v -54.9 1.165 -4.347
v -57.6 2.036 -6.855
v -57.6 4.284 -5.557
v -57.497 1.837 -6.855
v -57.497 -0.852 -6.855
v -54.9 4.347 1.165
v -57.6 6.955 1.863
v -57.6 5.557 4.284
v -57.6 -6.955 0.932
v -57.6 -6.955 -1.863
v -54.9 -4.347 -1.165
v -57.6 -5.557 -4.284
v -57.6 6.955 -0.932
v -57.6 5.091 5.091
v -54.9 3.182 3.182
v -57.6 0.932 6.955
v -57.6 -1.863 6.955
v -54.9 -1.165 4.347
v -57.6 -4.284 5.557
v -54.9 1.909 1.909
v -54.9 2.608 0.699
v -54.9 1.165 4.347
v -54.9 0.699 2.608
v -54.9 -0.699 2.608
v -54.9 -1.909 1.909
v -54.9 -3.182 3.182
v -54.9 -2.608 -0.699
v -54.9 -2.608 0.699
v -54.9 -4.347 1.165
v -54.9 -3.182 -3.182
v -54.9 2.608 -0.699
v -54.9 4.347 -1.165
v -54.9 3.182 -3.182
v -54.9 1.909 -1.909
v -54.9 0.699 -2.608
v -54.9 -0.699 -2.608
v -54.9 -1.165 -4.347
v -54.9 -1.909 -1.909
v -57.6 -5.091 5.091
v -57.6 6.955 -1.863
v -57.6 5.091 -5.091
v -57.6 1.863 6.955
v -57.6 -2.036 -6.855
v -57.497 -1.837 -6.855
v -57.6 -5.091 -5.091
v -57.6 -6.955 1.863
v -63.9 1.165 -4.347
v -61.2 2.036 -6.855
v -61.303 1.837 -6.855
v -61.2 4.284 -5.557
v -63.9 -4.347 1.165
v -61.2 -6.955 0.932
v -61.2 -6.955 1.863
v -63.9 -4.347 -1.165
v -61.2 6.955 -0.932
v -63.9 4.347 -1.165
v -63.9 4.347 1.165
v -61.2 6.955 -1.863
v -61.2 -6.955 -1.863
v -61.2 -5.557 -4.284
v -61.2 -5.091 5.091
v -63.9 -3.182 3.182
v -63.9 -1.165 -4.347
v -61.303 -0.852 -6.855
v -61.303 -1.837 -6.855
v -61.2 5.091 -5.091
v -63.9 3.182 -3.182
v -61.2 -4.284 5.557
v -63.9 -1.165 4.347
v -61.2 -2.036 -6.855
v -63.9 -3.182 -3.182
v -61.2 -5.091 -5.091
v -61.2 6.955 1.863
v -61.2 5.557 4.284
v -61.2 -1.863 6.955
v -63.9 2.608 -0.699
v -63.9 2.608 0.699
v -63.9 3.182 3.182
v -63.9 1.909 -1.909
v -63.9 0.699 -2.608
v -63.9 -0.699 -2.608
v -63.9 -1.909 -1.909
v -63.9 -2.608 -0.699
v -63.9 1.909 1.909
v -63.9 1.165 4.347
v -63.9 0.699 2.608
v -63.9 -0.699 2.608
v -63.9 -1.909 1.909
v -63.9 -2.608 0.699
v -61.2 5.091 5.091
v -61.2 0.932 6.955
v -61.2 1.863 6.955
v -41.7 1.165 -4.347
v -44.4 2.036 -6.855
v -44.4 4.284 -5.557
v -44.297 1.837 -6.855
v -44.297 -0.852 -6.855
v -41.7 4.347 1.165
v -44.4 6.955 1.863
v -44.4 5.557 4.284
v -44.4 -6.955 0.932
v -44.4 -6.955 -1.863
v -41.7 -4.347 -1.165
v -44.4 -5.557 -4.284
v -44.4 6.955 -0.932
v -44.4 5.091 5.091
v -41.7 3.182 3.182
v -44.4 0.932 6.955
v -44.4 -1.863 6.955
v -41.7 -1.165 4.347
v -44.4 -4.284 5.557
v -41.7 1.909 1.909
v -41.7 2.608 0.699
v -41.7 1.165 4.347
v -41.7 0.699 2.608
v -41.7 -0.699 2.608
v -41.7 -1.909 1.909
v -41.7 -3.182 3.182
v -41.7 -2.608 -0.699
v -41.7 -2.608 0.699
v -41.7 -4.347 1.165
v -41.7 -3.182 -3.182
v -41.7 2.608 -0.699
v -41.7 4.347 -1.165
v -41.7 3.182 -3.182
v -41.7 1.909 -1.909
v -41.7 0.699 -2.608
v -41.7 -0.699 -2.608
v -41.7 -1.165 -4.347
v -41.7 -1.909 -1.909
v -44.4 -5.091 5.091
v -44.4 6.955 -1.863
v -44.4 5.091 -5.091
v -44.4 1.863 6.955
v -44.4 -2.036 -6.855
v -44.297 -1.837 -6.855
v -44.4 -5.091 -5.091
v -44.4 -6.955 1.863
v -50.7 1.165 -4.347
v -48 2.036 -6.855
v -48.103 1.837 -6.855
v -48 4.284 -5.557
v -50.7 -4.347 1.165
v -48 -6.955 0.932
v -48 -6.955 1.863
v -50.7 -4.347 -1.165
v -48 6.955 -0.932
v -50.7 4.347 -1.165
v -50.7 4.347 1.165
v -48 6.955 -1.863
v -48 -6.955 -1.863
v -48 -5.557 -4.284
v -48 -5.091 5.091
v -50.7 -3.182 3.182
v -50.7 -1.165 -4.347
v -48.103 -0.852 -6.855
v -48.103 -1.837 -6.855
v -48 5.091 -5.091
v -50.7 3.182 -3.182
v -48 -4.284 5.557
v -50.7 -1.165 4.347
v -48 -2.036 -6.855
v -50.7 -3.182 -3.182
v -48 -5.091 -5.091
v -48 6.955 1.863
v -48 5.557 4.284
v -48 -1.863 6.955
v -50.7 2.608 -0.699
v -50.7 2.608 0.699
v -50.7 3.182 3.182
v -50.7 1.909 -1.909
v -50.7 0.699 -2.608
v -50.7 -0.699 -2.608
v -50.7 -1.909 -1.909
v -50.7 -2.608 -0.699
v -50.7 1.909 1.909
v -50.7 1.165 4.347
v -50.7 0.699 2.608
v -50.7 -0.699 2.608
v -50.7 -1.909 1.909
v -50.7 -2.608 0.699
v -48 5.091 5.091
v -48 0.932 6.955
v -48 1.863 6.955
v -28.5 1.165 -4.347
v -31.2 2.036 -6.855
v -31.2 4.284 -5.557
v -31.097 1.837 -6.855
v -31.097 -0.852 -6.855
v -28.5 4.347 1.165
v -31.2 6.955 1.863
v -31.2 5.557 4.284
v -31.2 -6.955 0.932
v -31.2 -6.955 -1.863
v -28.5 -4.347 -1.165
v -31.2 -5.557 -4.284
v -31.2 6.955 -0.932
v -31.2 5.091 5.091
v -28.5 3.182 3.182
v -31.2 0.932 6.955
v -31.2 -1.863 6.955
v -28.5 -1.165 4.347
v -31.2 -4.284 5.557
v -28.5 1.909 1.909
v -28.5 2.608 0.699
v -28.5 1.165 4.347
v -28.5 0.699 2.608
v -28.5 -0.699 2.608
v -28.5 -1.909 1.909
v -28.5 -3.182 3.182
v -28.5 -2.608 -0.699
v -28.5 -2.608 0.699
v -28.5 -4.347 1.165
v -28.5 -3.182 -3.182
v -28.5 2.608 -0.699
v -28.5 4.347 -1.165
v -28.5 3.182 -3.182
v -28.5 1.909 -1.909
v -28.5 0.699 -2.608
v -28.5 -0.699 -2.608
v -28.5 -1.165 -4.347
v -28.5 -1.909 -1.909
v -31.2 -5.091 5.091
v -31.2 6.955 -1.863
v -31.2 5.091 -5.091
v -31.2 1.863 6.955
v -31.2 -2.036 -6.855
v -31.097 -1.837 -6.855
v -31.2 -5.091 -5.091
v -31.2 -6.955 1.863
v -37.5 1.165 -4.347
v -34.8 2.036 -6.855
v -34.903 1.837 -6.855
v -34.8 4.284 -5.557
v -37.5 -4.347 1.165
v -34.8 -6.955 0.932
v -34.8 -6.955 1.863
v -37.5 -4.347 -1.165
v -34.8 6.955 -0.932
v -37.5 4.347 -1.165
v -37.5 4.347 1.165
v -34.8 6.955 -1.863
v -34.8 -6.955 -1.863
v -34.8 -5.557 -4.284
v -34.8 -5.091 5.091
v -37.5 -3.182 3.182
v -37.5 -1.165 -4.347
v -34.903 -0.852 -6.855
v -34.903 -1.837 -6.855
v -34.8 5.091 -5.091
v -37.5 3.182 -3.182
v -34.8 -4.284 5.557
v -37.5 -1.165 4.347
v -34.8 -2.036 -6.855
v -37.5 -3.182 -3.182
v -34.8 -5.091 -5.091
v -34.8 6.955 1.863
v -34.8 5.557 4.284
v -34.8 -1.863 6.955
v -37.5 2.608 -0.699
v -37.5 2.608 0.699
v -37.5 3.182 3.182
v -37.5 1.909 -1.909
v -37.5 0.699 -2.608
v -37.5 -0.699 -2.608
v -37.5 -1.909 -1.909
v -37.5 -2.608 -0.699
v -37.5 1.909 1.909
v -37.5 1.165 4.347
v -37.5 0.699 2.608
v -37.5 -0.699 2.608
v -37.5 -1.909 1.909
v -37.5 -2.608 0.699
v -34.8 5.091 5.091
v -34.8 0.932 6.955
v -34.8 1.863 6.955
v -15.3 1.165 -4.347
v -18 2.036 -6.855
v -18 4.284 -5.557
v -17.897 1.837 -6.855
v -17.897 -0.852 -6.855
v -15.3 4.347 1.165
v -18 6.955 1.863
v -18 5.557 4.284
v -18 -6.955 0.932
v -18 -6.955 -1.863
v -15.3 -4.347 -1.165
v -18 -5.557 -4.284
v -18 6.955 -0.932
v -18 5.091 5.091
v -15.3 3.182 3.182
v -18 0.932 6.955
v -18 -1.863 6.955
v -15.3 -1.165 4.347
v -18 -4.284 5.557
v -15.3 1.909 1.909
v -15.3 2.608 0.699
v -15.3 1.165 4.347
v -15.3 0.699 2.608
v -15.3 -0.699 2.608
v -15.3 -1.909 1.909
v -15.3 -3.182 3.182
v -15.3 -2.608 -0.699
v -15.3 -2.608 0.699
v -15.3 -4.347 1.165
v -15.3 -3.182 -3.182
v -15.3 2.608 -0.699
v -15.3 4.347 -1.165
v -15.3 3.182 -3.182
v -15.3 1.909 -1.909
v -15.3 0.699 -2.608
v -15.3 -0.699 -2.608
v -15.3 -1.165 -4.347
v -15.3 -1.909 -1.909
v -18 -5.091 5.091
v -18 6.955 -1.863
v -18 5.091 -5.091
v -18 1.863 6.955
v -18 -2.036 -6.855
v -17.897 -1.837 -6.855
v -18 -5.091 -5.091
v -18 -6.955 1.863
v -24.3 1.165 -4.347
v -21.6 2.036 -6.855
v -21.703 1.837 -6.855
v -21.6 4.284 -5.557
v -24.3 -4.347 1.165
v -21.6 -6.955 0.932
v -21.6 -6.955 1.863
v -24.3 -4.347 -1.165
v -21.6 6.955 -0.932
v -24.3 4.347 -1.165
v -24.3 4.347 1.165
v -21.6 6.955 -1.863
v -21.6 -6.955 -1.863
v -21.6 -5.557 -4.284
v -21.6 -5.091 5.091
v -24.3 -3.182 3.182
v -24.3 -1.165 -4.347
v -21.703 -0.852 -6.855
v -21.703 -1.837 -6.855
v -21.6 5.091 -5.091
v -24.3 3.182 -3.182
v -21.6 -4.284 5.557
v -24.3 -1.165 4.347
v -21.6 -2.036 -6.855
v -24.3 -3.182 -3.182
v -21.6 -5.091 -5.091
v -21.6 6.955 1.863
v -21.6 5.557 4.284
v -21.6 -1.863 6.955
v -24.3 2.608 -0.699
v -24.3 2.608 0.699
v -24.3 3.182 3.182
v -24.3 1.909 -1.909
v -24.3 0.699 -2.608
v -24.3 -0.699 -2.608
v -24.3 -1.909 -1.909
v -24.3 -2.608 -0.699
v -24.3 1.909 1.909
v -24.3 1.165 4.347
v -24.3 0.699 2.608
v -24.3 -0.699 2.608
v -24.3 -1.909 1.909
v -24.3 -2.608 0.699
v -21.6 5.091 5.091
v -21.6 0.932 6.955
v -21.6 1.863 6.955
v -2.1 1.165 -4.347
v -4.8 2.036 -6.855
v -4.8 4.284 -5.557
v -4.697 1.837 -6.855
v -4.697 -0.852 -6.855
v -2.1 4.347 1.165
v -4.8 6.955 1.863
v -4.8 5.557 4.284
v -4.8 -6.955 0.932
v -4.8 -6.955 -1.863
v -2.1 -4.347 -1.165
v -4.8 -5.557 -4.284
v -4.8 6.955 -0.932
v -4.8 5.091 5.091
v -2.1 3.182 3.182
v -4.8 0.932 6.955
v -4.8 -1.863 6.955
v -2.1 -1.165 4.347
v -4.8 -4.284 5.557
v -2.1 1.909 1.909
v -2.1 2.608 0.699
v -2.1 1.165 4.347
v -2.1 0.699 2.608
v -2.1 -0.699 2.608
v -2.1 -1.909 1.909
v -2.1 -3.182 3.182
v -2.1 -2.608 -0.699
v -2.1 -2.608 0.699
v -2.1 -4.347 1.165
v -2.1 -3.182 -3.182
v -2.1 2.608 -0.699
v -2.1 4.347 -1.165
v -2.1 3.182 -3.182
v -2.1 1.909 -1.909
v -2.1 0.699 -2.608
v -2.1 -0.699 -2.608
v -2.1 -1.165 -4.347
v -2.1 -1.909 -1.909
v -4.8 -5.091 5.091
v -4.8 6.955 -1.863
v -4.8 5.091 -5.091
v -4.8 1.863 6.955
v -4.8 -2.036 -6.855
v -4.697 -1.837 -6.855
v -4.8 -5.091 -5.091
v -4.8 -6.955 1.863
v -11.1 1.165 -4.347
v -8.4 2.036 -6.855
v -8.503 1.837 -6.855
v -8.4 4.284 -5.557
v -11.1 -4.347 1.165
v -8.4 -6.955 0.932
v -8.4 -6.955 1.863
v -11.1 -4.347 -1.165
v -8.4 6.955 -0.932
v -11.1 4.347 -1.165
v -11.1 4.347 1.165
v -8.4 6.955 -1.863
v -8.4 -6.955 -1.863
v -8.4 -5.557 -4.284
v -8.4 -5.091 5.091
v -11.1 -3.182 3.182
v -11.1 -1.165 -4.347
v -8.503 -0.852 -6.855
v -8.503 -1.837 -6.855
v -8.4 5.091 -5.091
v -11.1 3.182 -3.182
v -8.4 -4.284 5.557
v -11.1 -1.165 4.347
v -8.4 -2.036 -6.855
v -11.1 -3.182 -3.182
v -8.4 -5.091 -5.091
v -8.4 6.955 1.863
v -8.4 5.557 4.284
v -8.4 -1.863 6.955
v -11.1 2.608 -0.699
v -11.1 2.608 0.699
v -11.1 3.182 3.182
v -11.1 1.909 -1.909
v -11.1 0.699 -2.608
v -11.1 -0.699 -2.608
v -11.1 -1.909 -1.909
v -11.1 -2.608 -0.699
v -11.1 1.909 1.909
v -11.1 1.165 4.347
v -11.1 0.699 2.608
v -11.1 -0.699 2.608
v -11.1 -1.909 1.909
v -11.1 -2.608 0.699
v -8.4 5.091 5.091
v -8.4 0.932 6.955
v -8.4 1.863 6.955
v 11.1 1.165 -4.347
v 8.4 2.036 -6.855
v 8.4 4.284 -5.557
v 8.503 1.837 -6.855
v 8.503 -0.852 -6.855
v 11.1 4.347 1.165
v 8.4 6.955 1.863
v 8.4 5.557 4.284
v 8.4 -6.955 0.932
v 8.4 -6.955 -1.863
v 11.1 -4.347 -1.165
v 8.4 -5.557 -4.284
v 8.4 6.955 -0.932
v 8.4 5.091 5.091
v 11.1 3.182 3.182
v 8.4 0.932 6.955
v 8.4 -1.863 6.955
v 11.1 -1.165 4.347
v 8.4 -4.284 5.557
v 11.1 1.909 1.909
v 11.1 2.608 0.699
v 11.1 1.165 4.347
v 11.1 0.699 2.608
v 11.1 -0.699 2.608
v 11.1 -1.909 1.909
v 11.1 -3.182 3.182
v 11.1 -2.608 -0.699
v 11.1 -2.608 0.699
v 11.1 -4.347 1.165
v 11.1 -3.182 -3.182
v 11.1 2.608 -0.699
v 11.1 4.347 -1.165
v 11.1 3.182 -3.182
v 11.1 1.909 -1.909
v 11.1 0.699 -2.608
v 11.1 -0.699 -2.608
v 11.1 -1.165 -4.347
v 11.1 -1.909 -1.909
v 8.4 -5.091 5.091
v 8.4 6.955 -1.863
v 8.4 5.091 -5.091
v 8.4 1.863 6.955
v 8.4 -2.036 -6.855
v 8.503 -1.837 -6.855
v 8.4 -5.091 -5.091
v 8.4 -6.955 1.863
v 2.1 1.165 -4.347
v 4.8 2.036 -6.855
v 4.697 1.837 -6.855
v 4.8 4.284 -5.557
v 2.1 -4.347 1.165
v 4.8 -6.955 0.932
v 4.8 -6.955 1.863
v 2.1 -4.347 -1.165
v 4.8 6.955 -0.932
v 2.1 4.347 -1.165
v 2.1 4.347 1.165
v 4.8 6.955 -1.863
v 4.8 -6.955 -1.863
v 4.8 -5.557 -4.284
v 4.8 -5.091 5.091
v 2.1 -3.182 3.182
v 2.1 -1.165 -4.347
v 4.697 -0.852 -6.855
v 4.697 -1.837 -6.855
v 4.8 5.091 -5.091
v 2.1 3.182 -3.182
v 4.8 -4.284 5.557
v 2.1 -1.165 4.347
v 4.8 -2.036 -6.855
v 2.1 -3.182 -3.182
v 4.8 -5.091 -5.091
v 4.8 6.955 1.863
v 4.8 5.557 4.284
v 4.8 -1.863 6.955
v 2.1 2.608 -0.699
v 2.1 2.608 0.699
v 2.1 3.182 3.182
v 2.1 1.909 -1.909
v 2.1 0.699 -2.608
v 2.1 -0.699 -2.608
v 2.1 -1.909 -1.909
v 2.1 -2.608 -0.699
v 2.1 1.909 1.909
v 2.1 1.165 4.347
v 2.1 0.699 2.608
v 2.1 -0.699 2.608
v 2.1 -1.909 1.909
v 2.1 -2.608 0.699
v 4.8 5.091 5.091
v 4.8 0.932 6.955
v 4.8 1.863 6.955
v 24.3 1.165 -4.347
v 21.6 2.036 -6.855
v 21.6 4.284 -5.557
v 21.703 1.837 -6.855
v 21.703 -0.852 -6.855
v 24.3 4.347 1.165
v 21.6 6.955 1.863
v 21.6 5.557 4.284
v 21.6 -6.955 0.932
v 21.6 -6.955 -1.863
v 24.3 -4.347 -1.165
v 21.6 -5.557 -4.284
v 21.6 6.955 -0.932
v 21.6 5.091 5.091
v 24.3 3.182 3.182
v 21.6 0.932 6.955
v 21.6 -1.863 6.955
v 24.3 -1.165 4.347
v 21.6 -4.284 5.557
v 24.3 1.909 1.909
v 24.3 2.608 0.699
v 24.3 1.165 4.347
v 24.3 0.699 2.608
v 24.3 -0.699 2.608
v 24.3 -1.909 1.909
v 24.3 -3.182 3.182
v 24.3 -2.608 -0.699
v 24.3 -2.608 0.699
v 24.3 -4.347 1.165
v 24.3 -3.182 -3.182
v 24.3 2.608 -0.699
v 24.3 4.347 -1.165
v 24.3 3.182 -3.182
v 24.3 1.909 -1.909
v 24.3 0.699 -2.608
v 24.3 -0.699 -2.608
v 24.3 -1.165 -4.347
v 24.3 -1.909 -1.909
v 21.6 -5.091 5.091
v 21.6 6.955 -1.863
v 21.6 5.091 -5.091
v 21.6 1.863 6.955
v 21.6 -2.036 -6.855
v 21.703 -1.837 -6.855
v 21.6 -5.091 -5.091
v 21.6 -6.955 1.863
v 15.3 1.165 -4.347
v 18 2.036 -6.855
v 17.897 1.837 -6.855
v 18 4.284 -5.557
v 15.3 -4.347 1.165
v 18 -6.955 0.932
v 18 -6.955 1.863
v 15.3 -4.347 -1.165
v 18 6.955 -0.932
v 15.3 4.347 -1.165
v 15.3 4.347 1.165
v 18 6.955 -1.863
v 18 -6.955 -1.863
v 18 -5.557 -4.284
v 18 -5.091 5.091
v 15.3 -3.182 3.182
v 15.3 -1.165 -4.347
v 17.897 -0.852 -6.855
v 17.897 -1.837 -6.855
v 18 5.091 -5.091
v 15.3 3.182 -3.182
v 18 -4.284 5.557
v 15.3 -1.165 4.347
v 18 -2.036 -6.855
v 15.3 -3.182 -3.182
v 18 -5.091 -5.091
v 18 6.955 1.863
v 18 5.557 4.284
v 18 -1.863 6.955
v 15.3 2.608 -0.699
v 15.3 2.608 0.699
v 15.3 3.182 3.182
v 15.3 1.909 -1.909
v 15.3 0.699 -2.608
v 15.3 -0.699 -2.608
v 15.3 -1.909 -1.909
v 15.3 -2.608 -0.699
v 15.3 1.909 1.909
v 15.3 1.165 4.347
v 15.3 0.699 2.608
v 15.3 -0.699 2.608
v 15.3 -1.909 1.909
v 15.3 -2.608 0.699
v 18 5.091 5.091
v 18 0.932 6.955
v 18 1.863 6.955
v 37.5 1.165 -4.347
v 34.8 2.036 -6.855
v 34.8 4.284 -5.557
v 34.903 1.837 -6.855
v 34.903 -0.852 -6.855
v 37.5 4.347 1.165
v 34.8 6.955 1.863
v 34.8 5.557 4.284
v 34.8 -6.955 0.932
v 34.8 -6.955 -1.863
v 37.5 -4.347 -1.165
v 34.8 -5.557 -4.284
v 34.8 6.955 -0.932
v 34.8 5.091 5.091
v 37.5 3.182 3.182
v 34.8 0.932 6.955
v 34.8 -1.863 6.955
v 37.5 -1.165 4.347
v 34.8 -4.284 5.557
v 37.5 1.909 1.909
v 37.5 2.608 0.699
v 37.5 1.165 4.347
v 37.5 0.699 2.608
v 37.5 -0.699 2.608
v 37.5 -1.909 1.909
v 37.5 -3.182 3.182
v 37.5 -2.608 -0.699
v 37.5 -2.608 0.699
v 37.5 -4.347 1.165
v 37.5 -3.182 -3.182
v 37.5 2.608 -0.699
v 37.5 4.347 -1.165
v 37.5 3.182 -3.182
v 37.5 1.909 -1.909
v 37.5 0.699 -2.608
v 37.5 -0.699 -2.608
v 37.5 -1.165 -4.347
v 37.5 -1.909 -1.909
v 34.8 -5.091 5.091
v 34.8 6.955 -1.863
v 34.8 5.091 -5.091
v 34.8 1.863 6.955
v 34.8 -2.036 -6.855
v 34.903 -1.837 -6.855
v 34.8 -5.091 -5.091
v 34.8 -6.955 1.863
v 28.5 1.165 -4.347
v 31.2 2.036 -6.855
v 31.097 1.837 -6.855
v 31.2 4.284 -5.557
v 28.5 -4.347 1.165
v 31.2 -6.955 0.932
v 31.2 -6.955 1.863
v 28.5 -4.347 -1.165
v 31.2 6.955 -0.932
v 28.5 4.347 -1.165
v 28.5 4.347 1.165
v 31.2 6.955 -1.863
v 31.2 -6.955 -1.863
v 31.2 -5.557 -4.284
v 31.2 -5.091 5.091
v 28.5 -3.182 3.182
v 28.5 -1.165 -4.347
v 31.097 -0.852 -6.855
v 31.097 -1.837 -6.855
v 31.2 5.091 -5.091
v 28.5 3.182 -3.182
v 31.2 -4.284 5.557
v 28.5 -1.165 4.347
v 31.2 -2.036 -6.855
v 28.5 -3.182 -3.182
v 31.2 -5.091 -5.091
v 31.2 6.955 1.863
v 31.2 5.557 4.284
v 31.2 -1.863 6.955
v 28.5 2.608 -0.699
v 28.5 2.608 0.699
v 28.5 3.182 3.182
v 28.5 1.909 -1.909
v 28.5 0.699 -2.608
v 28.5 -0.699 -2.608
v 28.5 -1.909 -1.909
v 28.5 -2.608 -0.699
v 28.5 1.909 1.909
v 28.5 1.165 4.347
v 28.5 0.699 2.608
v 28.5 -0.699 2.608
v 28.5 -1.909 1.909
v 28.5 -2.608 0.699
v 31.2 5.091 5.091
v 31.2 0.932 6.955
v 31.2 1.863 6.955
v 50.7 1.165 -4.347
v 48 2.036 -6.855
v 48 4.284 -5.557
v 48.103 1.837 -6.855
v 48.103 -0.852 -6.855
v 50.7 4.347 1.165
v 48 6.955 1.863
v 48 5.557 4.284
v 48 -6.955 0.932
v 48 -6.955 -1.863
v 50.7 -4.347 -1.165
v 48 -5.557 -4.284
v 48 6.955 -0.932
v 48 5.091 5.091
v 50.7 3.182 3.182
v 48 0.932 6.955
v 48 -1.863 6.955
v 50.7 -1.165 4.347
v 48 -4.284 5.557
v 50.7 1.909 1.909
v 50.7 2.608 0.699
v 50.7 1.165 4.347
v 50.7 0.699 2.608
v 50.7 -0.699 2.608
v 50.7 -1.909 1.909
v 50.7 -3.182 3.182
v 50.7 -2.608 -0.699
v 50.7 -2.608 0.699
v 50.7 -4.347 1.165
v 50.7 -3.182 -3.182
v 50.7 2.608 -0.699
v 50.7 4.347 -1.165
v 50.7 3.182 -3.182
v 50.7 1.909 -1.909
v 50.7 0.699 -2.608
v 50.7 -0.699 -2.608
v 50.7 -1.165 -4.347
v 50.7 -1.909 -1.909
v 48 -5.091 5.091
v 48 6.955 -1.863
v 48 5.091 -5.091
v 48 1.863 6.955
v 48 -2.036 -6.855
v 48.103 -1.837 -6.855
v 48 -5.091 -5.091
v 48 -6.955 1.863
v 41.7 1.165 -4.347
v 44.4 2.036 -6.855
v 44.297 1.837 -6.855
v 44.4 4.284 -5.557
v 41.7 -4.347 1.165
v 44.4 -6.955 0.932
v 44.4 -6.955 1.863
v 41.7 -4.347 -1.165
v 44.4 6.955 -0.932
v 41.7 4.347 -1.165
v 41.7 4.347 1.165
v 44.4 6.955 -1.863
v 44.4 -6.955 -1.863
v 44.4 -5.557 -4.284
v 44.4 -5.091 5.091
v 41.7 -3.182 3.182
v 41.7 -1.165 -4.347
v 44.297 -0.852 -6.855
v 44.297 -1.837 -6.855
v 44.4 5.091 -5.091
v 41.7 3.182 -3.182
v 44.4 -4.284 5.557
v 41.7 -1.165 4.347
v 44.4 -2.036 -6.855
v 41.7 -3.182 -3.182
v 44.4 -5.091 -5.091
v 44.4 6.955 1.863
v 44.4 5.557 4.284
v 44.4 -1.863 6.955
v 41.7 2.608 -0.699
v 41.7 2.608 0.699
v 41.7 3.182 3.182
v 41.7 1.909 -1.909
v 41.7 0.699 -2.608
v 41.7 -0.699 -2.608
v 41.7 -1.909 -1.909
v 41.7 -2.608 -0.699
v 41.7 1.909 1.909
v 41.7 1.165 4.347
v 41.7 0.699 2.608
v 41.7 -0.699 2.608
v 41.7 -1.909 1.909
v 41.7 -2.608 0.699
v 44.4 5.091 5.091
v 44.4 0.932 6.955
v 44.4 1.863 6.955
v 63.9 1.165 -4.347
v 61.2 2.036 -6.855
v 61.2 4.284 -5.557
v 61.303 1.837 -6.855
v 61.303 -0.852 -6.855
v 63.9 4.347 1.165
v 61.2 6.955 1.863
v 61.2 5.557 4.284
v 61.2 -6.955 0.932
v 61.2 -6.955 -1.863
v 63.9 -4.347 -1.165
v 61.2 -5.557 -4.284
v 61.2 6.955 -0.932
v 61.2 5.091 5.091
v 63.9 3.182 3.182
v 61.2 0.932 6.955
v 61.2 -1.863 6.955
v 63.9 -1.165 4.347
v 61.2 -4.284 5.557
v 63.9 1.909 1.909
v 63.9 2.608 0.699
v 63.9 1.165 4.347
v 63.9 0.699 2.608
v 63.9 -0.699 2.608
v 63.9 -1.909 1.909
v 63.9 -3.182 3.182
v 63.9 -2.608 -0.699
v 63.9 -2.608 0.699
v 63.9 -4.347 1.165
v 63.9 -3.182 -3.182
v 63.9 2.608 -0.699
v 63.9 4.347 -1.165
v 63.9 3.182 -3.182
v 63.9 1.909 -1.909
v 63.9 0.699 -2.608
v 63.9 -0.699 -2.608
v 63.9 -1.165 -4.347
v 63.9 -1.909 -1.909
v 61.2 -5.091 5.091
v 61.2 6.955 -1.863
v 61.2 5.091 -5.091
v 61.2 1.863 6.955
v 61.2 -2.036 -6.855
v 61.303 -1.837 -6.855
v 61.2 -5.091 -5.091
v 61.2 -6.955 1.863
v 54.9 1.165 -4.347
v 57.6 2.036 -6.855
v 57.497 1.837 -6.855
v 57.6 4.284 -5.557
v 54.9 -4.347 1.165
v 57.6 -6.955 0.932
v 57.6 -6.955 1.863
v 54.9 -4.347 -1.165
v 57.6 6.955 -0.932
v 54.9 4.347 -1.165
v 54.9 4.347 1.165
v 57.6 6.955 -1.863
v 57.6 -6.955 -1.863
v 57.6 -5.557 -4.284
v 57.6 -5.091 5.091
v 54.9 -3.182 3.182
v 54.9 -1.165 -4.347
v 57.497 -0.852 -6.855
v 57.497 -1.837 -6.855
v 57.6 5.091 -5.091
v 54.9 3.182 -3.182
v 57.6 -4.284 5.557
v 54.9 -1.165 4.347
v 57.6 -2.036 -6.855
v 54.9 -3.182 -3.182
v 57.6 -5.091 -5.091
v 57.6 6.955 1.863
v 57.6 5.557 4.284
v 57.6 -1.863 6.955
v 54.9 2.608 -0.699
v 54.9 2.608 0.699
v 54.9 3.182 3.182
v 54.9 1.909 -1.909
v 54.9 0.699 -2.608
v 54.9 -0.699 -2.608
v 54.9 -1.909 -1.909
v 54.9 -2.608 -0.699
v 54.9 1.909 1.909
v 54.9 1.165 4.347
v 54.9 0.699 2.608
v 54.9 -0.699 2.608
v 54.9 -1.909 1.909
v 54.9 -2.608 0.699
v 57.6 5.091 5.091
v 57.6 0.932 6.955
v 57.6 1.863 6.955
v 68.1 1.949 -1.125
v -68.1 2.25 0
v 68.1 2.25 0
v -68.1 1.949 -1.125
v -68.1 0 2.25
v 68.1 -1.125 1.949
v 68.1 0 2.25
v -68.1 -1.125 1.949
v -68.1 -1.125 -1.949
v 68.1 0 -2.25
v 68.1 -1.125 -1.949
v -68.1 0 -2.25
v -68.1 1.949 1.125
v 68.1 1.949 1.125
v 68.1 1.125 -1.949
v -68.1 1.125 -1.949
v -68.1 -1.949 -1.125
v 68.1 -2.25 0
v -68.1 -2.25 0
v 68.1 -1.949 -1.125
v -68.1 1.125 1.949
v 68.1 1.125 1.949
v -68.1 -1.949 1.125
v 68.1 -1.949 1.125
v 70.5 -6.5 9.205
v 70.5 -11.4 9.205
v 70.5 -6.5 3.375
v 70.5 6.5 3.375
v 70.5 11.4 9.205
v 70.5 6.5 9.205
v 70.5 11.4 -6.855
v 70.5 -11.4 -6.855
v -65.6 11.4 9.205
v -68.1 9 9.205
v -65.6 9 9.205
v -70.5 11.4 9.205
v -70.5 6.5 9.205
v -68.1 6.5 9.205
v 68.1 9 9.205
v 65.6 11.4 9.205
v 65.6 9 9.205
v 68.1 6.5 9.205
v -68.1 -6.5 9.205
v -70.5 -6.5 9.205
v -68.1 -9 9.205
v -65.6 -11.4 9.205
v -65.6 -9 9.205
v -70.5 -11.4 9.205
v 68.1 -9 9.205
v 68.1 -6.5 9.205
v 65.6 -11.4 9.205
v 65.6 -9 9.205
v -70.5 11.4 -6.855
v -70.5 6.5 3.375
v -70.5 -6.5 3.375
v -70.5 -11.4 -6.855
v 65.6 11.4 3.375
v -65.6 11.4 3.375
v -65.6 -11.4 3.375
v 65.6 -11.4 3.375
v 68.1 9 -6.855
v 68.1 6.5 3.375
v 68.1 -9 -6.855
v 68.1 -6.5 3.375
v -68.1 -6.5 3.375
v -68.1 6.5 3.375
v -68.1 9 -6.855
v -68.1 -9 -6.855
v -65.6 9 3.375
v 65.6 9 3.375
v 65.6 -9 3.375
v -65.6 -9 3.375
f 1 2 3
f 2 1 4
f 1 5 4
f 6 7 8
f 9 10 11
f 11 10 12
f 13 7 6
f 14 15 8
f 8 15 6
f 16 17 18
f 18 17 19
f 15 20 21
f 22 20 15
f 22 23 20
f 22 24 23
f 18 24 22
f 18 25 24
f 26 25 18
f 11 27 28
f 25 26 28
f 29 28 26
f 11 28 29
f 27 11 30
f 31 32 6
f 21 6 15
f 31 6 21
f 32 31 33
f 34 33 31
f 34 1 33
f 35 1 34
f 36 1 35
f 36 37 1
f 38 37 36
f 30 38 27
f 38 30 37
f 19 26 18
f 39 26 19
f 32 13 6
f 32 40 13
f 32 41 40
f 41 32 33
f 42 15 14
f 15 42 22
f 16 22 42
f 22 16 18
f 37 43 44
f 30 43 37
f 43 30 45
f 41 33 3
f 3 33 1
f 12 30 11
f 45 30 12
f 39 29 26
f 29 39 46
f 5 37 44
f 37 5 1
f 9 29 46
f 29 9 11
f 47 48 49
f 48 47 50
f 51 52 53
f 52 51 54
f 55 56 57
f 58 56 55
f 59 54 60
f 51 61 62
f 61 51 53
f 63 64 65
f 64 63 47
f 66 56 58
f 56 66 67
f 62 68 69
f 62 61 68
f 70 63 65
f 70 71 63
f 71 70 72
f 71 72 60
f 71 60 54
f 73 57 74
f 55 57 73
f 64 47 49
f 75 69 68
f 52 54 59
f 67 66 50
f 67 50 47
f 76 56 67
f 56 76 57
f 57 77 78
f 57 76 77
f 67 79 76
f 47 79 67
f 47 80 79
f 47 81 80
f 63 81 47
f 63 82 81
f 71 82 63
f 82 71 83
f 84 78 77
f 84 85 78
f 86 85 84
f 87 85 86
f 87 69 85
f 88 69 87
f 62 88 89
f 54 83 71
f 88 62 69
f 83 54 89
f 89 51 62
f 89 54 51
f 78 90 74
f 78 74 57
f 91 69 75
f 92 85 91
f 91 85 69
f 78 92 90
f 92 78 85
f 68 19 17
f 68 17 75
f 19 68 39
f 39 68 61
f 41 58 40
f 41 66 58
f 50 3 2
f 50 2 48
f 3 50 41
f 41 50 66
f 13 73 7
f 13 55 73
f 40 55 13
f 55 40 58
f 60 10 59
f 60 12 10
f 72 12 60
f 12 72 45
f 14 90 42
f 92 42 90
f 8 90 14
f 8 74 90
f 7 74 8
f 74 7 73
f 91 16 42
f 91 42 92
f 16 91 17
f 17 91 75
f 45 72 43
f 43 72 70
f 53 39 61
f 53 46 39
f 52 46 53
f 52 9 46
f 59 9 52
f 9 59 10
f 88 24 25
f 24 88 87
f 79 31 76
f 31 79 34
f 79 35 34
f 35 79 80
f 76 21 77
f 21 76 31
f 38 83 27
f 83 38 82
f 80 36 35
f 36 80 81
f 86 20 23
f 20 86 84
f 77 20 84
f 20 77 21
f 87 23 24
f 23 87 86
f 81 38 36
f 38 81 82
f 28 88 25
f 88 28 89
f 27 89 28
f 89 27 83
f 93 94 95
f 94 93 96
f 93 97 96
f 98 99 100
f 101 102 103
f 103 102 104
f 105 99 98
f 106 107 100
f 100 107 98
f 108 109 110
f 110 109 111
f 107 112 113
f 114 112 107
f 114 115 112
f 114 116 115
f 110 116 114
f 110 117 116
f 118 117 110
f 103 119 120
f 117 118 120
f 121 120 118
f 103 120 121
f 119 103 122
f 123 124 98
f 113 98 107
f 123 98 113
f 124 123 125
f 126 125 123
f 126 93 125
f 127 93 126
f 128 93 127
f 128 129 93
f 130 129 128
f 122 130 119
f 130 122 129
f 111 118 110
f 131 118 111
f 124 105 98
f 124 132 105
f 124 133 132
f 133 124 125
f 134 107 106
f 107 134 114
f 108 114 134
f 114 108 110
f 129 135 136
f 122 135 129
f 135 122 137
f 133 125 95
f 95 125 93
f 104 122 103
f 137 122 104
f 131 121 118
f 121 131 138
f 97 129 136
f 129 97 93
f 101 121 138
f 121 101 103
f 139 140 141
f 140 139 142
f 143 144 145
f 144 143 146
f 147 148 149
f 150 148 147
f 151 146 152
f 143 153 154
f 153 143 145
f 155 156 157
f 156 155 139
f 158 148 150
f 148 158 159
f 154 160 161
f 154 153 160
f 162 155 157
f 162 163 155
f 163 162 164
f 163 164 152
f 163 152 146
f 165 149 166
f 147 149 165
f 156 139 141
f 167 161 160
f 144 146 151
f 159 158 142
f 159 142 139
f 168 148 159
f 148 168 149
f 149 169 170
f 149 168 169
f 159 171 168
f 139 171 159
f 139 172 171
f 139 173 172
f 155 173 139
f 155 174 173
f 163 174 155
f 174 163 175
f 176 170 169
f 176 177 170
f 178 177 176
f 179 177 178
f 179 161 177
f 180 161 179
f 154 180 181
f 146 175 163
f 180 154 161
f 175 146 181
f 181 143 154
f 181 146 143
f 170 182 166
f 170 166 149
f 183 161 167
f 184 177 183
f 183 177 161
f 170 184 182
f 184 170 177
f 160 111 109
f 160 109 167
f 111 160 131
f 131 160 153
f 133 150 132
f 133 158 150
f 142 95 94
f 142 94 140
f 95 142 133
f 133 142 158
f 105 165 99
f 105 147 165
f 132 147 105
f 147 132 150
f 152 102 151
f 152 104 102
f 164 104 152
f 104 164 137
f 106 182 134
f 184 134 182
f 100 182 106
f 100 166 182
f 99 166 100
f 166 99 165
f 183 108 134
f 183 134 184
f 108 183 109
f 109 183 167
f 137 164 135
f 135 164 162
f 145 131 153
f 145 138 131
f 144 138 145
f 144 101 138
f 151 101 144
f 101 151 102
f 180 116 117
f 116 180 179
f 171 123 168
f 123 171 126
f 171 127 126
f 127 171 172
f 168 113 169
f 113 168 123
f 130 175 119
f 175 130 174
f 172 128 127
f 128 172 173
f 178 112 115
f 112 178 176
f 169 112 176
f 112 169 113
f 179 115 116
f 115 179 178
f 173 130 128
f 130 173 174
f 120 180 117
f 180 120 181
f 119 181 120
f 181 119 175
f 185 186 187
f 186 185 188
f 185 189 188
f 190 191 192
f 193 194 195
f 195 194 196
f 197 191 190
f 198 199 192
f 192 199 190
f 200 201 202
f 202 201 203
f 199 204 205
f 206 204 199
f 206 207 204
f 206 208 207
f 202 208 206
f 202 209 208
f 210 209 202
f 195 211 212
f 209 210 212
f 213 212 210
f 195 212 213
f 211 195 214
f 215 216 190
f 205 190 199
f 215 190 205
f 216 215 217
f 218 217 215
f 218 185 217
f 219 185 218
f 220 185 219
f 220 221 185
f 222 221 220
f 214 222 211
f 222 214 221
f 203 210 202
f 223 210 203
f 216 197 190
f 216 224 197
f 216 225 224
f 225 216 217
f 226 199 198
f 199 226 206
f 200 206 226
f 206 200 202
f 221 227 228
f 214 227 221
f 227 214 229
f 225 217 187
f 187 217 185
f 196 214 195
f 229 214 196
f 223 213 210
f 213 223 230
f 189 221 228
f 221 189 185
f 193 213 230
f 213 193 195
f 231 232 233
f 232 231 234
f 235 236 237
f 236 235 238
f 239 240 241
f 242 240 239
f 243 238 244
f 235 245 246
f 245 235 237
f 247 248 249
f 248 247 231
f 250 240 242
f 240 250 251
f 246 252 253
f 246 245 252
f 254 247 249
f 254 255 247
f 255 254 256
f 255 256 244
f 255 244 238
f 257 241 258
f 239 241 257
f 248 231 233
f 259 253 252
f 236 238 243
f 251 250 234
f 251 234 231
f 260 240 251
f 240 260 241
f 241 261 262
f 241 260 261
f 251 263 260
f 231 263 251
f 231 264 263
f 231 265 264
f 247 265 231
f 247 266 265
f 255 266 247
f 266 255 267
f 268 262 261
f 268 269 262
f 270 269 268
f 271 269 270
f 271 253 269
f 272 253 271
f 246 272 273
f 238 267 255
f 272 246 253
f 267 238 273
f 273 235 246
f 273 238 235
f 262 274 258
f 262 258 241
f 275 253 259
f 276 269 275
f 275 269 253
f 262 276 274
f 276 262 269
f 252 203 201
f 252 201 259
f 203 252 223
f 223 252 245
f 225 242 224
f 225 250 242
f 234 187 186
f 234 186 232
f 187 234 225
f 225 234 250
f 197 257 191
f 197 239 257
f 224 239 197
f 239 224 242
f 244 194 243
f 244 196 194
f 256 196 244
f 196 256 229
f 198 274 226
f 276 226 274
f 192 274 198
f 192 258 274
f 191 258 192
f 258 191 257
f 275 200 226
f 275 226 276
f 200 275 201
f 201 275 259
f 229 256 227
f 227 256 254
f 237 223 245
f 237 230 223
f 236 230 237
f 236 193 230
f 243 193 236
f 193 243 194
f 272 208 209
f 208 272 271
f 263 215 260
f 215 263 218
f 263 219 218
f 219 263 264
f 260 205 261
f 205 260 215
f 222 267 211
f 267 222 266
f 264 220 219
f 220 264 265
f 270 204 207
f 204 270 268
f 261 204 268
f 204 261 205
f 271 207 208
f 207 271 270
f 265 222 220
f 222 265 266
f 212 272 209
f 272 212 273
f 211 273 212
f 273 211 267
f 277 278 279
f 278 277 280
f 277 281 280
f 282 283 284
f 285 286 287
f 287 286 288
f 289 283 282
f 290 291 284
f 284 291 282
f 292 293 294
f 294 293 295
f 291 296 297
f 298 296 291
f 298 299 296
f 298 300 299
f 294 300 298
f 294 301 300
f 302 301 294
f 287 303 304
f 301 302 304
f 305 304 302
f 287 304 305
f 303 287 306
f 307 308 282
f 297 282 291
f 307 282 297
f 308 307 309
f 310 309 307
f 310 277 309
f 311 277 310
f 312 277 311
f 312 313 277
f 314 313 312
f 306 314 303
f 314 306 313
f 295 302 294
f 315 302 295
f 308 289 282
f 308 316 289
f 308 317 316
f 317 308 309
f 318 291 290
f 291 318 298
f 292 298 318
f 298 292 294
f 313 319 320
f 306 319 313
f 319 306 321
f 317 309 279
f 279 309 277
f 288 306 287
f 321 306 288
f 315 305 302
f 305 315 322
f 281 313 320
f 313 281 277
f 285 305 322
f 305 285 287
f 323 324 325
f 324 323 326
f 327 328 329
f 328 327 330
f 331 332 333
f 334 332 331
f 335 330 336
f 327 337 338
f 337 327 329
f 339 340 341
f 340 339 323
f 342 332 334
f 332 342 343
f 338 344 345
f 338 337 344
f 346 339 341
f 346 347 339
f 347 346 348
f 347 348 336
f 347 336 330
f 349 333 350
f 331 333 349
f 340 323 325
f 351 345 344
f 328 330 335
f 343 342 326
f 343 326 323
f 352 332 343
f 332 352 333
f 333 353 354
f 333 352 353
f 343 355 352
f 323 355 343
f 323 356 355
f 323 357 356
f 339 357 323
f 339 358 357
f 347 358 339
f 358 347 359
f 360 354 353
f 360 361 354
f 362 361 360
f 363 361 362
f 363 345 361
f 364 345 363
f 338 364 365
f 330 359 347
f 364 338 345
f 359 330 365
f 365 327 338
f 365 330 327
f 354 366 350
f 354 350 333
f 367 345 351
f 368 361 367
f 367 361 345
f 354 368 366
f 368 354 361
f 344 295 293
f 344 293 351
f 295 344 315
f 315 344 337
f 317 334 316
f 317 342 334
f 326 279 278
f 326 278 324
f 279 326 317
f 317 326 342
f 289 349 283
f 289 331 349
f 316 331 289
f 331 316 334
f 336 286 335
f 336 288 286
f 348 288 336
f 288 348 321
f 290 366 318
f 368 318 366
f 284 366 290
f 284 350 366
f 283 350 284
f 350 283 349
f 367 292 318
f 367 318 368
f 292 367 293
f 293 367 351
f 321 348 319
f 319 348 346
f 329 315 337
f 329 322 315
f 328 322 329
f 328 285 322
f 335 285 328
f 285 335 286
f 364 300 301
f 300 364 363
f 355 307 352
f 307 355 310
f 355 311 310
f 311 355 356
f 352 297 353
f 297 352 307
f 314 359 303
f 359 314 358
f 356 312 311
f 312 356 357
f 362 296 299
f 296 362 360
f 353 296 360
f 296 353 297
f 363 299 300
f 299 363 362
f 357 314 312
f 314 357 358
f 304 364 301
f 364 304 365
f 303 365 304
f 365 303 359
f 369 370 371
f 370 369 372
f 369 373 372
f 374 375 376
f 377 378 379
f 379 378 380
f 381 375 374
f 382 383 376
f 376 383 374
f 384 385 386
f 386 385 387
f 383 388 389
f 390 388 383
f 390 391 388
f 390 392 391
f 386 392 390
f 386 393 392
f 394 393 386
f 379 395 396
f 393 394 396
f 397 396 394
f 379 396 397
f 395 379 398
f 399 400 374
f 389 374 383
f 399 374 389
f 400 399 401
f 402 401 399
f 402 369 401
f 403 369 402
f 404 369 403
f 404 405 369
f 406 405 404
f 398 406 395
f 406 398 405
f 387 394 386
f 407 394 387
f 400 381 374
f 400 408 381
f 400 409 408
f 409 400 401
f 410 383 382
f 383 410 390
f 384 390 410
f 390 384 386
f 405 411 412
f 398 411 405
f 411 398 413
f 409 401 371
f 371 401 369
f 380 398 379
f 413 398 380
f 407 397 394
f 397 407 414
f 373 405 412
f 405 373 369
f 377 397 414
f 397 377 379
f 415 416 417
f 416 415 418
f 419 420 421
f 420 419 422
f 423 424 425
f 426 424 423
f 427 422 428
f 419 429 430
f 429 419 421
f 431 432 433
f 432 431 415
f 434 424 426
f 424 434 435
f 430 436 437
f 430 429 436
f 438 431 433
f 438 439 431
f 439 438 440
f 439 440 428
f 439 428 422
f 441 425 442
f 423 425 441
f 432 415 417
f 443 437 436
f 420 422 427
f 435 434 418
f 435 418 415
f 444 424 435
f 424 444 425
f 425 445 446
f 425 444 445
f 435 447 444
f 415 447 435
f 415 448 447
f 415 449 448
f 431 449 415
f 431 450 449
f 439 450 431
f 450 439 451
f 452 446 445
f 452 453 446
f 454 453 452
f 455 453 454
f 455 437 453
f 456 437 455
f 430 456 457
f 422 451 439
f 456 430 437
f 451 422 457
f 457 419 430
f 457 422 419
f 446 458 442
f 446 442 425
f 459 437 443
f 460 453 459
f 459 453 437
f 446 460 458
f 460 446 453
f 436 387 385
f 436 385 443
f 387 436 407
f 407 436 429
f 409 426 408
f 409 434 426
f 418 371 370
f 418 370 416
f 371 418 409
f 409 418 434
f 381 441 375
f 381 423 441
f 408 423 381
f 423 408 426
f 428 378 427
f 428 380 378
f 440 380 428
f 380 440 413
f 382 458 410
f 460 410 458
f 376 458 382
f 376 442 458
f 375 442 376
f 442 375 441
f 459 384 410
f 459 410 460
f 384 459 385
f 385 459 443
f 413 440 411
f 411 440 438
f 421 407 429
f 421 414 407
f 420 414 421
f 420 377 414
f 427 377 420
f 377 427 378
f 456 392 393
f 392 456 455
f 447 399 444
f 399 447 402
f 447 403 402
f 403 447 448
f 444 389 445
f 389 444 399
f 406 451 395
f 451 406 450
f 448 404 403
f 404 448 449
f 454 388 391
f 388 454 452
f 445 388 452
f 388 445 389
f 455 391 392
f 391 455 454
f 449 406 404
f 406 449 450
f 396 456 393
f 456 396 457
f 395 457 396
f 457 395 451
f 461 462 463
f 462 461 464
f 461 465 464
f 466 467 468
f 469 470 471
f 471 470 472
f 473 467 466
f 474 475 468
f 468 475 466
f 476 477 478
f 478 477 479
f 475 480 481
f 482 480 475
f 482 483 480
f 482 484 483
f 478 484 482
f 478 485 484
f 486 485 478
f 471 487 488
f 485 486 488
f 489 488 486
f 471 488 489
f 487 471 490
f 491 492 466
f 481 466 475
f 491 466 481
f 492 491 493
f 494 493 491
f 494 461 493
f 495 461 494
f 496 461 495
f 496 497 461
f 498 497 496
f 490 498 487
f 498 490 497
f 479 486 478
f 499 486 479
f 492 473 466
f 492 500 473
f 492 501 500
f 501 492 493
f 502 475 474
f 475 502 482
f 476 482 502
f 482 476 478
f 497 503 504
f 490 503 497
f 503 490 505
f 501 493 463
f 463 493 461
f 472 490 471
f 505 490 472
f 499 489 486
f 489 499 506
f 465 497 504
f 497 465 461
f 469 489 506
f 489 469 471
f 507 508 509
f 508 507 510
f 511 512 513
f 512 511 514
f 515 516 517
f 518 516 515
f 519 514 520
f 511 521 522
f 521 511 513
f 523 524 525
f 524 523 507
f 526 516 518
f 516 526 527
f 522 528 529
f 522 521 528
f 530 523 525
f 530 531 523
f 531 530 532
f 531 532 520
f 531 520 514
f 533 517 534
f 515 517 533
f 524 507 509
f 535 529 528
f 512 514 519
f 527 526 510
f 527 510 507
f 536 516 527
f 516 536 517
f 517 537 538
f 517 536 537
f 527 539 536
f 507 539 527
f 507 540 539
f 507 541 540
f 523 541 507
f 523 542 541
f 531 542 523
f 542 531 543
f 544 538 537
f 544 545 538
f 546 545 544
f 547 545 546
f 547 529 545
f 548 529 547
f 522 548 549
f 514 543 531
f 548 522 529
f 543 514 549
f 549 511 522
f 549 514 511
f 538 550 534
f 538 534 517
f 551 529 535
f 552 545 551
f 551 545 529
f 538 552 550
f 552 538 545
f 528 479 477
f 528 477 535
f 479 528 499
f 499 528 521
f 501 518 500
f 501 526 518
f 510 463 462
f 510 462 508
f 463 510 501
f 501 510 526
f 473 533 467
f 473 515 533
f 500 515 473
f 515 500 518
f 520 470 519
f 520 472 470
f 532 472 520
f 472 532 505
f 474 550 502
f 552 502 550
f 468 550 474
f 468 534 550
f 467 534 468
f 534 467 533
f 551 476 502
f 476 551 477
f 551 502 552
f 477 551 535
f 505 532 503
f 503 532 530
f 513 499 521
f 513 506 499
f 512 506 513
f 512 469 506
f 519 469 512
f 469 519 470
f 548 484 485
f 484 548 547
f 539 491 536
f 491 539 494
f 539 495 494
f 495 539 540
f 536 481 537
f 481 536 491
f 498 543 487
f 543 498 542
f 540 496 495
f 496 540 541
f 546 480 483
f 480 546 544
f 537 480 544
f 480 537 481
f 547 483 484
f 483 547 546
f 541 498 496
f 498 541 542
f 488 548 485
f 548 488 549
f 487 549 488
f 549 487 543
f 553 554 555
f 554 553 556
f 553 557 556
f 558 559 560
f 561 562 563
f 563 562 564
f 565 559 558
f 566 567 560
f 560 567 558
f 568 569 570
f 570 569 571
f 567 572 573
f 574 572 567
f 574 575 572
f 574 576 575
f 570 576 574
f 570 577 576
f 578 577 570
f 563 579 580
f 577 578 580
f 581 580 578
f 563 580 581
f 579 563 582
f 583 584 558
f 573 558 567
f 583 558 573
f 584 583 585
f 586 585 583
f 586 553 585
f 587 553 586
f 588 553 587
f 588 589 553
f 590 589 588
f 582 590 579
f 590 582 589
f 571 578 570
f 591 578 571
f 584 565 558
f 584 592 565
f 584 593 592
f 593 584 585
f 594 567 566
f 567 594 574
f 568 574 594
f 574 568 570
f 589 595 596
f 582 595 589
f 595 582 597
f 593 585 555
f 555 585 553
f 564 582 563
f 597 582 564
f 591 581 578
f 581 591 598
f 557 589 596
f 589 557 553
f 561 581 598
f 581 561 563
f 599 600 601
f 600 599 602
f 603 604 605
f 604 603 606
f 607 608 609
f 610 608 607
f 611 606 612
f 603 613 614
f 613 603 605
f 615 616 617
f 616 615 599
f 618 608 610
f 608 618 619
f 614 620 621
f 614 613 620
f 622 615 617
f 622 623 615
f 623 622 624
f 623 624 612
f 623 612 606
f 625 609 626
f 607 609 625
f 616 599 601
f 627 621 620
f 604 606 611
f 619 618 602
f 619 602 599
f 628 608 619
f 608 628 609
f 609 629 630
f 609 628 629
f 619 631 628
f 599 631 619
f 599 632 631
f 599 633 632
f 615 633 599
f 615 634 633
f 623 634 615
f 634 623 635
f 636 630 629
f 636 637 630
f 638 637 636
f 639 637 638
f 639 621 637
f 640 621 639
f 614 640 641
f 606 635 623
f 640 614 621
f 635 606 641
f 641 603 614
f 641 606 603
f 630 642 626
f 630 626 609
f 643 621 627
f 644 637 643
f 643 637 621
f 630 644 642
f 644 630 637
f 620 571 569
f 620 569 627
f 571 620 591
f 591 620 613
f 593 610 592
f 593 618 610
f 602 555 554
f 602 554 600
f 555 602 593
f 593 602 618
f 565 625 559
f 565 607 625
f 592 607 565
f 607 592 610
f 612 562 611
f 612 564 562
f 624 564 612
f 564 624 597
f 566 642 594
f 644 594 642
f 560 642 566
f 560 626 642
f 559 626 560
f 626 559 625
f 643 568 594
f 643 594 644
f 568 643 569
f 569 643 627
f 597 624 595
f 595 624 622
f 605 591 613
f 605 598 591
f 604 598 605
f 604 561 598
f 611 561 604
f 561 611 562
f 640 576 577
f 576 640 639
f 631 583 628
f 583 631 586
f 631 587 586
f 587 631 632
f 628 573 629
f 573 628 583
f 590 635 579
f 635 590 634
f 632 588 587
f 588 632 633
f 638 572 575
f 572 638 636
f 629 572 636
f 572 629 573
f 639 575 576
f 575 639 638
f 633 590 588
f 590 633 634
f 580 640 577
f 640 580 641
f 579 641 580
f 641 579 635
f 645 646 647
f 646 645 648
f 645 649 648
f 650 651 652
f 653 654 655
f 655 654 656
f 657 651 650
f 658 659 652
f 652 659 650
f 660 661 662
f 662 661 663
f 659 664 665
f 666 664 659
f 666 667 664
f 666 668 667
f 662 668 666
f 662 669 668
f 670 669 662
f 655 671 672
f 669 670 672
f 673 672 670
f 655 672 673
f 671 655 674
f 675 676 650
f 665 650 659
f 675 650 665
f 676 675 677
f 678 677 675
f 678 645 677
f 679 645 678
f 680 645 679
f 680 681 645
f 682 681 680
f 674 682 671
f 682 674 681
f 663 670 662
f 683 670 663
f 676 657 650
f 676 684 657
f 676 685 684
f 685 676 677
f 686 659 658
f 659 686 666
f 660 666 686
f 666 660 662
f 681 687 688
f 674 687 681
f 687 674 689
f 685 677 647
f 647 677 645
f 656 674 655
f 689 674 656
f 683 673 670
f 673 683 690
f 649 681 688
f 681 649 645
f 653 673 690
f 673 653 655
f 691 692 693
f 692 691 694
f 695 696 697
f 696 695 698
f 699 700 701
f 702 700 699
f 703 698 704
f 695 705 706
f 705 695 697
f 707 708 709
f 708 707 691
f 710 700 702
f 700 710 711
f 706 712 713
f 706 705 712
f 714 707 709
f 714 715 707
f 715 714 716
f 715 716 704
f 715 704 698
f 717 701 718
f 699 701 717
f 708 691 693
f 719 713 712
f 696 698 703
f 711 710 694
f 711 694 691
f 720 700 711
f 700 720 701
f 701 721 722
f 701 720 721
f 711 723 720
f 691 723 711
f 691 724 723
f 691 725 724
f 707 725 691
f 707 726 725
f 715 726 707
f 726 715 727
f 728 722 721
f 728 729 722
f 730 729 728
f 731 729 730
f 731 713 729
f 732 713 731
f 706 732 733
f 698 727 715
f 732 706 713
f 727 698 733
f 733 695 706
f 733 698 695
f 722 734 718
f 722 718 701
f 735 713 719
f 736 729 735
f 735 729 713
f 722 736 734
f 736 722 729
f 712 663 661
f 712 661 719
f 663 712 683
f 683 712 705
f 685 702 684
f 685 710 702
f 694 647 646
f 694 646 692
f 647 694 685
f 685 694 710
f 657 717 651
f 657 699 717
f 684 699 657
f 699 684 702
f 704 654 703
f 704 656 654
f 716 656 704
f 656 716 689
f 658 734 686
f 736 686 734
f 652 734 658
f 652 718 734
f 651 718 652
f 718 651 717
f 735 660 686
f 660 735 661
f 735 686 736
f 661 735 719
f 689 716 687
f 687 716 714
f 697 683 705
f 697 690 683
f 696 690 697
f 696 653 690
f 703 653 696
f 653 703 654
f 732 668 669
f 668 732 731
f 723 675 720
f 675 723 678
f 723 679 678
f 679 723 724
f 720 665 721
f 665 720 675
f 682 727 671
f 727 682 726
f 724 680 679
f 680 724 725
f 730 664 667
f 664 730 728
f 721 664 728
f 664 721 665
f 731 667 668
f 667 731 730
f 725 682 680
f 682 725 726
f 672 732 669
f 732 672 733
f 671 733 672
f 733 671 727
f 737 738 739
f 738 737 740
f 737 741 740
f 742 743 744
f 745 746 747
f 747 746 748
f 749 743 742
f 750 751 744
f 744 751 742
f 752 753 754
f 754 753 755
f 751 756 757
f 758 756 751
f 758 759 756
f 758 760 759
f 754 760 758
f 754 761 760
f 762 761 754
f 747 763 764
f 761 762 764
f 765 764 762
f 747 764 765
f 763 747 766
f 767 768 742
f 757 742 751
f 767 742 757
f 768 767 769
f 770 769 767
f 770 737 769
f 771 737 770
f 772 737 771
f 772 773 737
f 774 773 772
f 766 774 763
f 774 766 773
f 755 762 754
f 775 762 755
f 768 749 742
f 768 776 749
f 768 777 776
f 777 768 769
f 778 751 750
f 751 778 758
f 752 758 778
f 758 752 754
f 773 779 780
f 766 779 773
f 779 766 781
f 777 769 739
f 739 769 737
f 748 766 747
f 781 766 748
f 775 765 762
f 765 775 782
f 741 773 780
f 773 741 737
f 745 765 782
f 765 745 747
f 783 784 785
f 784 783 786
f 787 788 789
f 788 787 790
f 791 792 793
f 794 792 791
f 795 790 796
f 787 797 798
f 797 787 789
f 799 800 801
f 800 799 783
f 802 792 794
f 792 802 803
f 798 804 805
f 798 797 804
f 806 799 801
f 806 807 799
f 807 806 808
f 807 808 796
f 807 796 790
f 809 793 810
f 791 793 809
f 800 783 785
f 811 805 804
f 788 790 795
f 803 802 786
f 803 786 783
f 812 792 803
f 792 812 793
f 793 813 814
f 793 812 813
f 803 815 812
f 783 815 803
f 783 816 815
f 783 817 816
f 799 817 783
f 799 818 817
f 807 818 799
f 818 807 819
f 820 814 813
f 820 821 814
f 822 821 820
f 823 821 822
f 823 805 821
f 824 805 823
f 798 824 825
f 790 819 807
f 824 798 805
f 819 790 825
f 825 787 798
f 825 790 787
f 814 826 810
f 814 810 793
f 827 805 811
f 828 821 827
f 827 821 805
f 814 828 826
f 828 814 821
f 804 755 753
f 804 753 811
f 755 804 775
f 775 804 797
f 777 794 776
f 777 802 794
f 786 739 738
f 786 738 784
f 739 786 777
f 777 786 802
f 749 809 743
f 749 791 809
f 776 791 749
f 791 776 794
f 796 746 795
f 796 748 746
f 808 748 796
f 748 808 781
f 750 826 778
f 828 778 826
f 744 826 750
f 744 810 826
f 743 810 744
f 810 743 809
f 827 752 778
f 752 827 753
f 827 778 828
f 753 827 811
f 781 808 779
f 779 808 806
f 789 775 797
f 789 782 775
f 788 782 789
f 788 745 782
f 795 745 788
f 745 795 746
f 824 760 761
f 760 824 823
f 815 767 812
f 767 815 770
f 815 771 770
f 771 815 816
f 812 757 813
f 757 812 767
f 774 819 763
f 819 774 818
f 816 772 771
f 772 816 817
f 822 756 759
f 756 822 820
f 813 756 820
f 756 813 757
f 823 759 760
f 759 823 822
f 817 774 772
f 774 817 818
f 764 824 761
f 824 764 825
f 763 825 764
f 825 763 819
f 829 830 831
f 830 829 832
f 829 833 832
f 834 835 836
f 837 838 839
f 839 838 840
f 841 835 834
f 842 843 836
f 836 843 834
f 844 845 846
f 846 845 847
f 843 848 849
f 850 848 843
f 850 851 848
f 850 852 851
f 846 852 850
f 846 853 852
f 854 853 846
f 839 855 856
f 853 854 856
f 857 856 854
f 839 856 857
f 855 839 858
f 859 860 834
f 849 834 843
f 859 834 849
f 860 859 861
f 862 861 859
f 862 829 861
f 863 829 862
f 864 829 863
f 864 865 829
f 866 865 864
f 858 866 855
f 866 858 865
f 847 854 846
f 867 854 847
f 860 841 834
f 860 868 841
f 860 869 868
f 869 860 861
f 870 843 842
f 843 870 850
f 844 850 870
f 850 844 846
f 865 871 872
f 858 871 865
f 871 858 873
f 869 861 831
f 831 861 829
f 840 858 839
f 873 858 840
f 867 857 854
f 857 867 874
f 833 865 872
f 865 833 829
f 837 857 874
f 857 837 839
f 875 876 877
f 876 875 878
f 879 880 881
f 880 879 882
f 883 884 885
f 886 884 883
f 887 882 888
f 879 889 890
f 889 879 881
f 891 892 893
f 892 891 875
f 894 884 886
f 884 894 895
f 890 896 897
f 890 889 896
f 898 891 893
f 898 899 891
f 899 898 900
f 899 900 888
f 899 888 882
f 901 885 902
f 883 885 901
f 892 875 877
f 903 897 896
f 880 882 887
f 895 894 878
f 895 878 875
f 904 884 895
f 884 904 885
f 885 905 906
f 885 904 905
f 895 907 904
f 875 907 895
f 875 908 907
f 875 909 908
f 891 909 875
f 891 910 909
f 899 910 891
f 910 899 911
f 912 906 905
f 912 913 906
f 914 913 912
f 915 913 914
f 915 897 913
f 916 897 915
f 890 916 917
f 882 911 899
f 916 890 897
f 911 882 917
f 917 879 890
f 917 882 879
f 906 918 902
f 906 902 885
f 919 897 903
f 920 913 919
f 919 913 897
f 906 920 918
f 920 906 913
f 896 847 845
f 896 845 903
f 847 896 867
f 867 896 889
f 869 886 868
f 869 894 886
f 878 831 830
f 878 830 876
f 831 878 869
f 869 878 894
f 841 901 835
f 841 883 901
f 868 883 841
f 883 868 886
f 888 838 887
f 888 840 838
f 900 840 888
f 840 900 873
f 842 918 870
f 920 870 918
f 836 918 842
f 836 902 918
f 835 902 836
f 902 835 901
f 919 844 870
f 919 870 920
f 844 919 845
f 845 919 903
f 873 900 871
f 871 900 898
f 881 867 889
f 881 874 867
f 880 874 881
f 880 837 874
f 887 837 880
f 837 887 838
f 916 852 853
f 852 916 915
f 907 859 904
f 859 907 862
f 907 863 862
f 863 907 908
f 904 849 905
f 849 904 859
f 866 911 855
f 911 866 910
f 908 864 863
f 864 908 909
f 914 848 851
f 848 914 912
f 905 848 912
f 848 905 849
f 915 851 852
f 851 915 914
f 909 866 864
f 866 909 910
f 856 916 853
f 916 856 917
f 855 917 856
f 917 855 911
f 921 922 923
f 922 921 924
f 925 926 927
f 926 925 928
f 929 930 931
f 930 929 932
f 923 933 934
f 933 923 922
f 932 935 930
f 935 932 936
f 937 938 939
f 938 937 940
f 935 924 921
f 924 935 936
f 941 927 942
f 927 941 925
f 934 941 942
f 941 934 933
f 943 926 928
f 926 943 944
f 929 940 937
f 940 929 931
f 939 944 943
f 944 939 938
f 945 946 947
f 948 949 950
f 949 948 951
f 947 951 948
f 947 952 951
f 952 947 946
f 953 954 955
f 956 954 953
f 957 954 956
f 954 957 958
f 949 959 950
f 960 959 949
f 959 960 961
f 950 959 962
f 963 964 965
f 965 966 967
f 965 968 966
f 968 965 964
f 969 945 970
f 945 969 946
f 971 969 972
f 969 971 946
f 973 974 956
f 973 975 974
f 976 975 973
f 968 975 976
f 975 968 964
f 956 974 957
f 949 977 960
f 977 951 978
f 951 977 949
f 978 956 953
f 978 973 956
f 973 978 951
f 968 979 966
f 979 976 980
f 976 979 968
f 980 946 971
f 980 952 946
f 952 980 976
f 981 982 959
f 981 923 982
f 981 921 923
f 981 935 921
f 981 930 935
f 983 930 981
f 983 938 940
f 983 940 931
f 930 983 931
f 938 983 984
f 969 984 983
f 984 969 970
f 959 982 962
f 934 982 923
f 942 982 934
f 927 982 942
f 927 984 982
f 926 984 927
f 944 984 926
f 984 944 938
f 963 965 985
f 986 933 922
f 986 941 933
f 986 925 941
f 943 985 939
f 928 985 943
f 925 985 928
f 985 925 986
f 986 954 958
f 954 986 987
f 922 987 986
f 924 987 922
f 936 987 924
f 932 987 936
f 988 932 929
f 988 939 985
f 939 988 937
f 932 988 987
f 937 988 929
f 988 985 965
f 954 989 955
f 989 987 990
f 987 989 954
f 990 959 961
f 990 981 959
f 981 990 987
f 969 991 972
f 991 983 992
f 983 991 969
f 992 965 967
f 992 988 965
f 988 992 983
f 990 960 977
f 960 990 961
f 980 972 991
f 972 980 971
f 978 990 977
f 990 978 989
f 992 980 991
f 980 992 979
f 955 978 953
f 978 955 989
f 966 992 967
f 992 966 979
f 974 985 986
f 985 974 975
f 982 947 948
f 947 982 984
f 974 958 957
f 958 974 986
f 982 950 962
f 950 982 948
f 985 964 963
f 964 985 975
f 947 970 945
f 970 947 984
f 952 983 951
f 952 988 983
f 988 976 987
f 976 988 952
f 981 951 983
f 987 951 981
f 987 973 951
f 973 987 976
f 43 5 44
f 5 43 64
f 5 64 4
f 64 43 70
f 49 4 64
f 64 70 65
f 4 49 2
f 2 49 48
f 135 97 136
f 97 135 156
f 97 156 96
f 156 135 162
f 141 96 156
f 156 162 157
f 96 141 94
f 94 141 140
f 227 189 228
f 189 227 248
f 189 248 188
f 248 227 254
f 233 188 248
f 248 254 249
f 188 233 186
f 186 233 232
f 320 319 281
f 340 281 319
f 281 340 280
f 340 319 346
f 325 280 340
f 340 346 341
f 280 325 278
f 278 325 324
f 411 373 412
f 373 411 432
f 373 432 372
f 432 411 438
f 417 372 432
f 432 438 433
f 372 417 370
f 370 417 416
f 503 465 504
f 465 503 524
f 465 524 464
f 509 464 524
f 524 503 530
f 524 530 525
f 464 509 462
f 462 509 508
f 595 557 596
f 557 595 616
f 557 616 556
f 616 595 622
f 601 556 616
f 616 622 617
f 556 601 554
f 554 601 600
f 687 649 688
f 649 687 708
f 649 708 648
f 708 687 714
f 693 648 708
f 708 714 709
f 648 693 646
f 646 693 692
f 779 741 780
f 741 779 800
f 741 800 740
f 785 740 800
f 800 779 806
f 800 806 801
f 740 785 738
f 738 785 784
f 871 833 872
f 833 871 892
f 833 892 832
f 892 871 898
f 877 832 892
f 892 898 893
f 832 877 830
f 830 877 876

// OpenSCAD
number_of_balls=10; 

//Thickness in mm, scaled by 0.6
Thickness_of_box=4;

//Distance between two balls in mm, scaled by 0.6
distance_between_balls=7;



// Configurable Abacus
// Version 3, March 2014

// By default, its a 10-ball version is for the board game Tikal to count the action points remaining
// Print it "upside down" with the feet up. It prints in one go.
// After printing, move the balls a bit and pull out the plastic fibers which are loose.

// Written by MC Geisler (m c genki at gmail dot com)

// This program is free software; you can redistribute it and/or modify
// it under the terms of the GNU General Public License as published by
// the Free Software Foundation; either version 2 of the License, or
// (at your option) any later version.
// See the GNU General Public License for more details.


//Scaling the Abacus
scale=0.6; 

ball_width_radius=15*scale; //if it would be pointy in the middle
ballabstand=distance_between_balls*scale; 
ball_height_radius=ball_width_radius*.8;//the radius of the flattening cylinder in the middle
ball_min_height_radius=ball_height_radius*.966;

stangenradius=ball_width_radius/4;
stangenluft=.75*scale; //bei 1mm*scale wackelts noch, entspricht 0.52356 -> 0,3
echo ("Distance rod to ball: ",stangenluft); 

//make the balls with 12 faces
$fn=12;


stangenlaenge=(ball_width_radius+ballabstand)*number_of_balls+ballabstand;

kistendicke=Thickness_of_box*scale;
kistenhoehe=ball_min_height_radius*2+stangenradius;
kisteninnenbreite=ball_height_radius*2.5;
kisteninnenlaenge=stangenlaenge;

kistenlaenge=kisteninnenlaenge+2*kistendicke;
kistenbreite=kisteninnenbreite+2*kistendicke;

echo ("Length of Abacus: ",kistenlaenge); 

module halberball()
{
	cylinder(h = ball_width_radius/2, r1 = ball_width_radius, r2 = ball_width_radius/2, center = false);
}

module ball()
{
	rotate([360/$fn/2,0,0])
	rotate([0,90,0])
	difference()
	{
		union()
		{
			halberball();
			mirror([0,0,1]) halberball();
		}
			cylinder(h = ball_width_radius*3, r = stangenradius+stangenluft,center=true);
			difference()
			{
				cylinder(h = ball_width_radius*3, r = ball_width_radius*2,center=true);
				cylinder(h = ball_width_radius*3, r = ball_height_radius,center=true);
			}
	}
}

//----------------------------------

difference()
{
	union()
	{
		//kugeln
		translate([-stangenlaenge/2,0,0])
		{
			for (i = [0:number_of_balls-1]) 
			{
					translate([ball_width_radius/2+ballabstand+i*(ball_width_radius+ballabstand),0,0])
						ball(i);
			}
			
			//stange
			rotate([0,90,0])
				translate([0,0,-kistendicke/2])
					cylinder(h=stangenlaenge+kistendicke, r=stangenradius);
		}

		//kiste
		translate([0,0,(kistenhoehe-ball_min_height_radius*2)/2])
		{
			difference()
			{
				cube([kistenlaenge,kistenbreite,kistenhoehe],center=true);
				cube([kisteninnenlaenge,kisteninnenbreite,kistenhoehe*2],center=true);

				translate([0,0,kistenhoehe/2+stangenradius])
					cube([kisteninnenlaenge-5,kisteninnenbreite*2,kistenhoehe],center=true);
				translate([0,0,kistenhoehe/2+stangenradius])
					cube([kisteninnenlaenge*2,kisteninnenbreite-5,kistenhoehe],center=true);
				
			}
		}
	}
	
	translate([0,0,-30/2-ball_min_height_radius+.1])
		cube([kisteninnenlaenge+2*kistendicke*2,kisteninnenbreite+2*kistendicke*2,30],center=true);
}
